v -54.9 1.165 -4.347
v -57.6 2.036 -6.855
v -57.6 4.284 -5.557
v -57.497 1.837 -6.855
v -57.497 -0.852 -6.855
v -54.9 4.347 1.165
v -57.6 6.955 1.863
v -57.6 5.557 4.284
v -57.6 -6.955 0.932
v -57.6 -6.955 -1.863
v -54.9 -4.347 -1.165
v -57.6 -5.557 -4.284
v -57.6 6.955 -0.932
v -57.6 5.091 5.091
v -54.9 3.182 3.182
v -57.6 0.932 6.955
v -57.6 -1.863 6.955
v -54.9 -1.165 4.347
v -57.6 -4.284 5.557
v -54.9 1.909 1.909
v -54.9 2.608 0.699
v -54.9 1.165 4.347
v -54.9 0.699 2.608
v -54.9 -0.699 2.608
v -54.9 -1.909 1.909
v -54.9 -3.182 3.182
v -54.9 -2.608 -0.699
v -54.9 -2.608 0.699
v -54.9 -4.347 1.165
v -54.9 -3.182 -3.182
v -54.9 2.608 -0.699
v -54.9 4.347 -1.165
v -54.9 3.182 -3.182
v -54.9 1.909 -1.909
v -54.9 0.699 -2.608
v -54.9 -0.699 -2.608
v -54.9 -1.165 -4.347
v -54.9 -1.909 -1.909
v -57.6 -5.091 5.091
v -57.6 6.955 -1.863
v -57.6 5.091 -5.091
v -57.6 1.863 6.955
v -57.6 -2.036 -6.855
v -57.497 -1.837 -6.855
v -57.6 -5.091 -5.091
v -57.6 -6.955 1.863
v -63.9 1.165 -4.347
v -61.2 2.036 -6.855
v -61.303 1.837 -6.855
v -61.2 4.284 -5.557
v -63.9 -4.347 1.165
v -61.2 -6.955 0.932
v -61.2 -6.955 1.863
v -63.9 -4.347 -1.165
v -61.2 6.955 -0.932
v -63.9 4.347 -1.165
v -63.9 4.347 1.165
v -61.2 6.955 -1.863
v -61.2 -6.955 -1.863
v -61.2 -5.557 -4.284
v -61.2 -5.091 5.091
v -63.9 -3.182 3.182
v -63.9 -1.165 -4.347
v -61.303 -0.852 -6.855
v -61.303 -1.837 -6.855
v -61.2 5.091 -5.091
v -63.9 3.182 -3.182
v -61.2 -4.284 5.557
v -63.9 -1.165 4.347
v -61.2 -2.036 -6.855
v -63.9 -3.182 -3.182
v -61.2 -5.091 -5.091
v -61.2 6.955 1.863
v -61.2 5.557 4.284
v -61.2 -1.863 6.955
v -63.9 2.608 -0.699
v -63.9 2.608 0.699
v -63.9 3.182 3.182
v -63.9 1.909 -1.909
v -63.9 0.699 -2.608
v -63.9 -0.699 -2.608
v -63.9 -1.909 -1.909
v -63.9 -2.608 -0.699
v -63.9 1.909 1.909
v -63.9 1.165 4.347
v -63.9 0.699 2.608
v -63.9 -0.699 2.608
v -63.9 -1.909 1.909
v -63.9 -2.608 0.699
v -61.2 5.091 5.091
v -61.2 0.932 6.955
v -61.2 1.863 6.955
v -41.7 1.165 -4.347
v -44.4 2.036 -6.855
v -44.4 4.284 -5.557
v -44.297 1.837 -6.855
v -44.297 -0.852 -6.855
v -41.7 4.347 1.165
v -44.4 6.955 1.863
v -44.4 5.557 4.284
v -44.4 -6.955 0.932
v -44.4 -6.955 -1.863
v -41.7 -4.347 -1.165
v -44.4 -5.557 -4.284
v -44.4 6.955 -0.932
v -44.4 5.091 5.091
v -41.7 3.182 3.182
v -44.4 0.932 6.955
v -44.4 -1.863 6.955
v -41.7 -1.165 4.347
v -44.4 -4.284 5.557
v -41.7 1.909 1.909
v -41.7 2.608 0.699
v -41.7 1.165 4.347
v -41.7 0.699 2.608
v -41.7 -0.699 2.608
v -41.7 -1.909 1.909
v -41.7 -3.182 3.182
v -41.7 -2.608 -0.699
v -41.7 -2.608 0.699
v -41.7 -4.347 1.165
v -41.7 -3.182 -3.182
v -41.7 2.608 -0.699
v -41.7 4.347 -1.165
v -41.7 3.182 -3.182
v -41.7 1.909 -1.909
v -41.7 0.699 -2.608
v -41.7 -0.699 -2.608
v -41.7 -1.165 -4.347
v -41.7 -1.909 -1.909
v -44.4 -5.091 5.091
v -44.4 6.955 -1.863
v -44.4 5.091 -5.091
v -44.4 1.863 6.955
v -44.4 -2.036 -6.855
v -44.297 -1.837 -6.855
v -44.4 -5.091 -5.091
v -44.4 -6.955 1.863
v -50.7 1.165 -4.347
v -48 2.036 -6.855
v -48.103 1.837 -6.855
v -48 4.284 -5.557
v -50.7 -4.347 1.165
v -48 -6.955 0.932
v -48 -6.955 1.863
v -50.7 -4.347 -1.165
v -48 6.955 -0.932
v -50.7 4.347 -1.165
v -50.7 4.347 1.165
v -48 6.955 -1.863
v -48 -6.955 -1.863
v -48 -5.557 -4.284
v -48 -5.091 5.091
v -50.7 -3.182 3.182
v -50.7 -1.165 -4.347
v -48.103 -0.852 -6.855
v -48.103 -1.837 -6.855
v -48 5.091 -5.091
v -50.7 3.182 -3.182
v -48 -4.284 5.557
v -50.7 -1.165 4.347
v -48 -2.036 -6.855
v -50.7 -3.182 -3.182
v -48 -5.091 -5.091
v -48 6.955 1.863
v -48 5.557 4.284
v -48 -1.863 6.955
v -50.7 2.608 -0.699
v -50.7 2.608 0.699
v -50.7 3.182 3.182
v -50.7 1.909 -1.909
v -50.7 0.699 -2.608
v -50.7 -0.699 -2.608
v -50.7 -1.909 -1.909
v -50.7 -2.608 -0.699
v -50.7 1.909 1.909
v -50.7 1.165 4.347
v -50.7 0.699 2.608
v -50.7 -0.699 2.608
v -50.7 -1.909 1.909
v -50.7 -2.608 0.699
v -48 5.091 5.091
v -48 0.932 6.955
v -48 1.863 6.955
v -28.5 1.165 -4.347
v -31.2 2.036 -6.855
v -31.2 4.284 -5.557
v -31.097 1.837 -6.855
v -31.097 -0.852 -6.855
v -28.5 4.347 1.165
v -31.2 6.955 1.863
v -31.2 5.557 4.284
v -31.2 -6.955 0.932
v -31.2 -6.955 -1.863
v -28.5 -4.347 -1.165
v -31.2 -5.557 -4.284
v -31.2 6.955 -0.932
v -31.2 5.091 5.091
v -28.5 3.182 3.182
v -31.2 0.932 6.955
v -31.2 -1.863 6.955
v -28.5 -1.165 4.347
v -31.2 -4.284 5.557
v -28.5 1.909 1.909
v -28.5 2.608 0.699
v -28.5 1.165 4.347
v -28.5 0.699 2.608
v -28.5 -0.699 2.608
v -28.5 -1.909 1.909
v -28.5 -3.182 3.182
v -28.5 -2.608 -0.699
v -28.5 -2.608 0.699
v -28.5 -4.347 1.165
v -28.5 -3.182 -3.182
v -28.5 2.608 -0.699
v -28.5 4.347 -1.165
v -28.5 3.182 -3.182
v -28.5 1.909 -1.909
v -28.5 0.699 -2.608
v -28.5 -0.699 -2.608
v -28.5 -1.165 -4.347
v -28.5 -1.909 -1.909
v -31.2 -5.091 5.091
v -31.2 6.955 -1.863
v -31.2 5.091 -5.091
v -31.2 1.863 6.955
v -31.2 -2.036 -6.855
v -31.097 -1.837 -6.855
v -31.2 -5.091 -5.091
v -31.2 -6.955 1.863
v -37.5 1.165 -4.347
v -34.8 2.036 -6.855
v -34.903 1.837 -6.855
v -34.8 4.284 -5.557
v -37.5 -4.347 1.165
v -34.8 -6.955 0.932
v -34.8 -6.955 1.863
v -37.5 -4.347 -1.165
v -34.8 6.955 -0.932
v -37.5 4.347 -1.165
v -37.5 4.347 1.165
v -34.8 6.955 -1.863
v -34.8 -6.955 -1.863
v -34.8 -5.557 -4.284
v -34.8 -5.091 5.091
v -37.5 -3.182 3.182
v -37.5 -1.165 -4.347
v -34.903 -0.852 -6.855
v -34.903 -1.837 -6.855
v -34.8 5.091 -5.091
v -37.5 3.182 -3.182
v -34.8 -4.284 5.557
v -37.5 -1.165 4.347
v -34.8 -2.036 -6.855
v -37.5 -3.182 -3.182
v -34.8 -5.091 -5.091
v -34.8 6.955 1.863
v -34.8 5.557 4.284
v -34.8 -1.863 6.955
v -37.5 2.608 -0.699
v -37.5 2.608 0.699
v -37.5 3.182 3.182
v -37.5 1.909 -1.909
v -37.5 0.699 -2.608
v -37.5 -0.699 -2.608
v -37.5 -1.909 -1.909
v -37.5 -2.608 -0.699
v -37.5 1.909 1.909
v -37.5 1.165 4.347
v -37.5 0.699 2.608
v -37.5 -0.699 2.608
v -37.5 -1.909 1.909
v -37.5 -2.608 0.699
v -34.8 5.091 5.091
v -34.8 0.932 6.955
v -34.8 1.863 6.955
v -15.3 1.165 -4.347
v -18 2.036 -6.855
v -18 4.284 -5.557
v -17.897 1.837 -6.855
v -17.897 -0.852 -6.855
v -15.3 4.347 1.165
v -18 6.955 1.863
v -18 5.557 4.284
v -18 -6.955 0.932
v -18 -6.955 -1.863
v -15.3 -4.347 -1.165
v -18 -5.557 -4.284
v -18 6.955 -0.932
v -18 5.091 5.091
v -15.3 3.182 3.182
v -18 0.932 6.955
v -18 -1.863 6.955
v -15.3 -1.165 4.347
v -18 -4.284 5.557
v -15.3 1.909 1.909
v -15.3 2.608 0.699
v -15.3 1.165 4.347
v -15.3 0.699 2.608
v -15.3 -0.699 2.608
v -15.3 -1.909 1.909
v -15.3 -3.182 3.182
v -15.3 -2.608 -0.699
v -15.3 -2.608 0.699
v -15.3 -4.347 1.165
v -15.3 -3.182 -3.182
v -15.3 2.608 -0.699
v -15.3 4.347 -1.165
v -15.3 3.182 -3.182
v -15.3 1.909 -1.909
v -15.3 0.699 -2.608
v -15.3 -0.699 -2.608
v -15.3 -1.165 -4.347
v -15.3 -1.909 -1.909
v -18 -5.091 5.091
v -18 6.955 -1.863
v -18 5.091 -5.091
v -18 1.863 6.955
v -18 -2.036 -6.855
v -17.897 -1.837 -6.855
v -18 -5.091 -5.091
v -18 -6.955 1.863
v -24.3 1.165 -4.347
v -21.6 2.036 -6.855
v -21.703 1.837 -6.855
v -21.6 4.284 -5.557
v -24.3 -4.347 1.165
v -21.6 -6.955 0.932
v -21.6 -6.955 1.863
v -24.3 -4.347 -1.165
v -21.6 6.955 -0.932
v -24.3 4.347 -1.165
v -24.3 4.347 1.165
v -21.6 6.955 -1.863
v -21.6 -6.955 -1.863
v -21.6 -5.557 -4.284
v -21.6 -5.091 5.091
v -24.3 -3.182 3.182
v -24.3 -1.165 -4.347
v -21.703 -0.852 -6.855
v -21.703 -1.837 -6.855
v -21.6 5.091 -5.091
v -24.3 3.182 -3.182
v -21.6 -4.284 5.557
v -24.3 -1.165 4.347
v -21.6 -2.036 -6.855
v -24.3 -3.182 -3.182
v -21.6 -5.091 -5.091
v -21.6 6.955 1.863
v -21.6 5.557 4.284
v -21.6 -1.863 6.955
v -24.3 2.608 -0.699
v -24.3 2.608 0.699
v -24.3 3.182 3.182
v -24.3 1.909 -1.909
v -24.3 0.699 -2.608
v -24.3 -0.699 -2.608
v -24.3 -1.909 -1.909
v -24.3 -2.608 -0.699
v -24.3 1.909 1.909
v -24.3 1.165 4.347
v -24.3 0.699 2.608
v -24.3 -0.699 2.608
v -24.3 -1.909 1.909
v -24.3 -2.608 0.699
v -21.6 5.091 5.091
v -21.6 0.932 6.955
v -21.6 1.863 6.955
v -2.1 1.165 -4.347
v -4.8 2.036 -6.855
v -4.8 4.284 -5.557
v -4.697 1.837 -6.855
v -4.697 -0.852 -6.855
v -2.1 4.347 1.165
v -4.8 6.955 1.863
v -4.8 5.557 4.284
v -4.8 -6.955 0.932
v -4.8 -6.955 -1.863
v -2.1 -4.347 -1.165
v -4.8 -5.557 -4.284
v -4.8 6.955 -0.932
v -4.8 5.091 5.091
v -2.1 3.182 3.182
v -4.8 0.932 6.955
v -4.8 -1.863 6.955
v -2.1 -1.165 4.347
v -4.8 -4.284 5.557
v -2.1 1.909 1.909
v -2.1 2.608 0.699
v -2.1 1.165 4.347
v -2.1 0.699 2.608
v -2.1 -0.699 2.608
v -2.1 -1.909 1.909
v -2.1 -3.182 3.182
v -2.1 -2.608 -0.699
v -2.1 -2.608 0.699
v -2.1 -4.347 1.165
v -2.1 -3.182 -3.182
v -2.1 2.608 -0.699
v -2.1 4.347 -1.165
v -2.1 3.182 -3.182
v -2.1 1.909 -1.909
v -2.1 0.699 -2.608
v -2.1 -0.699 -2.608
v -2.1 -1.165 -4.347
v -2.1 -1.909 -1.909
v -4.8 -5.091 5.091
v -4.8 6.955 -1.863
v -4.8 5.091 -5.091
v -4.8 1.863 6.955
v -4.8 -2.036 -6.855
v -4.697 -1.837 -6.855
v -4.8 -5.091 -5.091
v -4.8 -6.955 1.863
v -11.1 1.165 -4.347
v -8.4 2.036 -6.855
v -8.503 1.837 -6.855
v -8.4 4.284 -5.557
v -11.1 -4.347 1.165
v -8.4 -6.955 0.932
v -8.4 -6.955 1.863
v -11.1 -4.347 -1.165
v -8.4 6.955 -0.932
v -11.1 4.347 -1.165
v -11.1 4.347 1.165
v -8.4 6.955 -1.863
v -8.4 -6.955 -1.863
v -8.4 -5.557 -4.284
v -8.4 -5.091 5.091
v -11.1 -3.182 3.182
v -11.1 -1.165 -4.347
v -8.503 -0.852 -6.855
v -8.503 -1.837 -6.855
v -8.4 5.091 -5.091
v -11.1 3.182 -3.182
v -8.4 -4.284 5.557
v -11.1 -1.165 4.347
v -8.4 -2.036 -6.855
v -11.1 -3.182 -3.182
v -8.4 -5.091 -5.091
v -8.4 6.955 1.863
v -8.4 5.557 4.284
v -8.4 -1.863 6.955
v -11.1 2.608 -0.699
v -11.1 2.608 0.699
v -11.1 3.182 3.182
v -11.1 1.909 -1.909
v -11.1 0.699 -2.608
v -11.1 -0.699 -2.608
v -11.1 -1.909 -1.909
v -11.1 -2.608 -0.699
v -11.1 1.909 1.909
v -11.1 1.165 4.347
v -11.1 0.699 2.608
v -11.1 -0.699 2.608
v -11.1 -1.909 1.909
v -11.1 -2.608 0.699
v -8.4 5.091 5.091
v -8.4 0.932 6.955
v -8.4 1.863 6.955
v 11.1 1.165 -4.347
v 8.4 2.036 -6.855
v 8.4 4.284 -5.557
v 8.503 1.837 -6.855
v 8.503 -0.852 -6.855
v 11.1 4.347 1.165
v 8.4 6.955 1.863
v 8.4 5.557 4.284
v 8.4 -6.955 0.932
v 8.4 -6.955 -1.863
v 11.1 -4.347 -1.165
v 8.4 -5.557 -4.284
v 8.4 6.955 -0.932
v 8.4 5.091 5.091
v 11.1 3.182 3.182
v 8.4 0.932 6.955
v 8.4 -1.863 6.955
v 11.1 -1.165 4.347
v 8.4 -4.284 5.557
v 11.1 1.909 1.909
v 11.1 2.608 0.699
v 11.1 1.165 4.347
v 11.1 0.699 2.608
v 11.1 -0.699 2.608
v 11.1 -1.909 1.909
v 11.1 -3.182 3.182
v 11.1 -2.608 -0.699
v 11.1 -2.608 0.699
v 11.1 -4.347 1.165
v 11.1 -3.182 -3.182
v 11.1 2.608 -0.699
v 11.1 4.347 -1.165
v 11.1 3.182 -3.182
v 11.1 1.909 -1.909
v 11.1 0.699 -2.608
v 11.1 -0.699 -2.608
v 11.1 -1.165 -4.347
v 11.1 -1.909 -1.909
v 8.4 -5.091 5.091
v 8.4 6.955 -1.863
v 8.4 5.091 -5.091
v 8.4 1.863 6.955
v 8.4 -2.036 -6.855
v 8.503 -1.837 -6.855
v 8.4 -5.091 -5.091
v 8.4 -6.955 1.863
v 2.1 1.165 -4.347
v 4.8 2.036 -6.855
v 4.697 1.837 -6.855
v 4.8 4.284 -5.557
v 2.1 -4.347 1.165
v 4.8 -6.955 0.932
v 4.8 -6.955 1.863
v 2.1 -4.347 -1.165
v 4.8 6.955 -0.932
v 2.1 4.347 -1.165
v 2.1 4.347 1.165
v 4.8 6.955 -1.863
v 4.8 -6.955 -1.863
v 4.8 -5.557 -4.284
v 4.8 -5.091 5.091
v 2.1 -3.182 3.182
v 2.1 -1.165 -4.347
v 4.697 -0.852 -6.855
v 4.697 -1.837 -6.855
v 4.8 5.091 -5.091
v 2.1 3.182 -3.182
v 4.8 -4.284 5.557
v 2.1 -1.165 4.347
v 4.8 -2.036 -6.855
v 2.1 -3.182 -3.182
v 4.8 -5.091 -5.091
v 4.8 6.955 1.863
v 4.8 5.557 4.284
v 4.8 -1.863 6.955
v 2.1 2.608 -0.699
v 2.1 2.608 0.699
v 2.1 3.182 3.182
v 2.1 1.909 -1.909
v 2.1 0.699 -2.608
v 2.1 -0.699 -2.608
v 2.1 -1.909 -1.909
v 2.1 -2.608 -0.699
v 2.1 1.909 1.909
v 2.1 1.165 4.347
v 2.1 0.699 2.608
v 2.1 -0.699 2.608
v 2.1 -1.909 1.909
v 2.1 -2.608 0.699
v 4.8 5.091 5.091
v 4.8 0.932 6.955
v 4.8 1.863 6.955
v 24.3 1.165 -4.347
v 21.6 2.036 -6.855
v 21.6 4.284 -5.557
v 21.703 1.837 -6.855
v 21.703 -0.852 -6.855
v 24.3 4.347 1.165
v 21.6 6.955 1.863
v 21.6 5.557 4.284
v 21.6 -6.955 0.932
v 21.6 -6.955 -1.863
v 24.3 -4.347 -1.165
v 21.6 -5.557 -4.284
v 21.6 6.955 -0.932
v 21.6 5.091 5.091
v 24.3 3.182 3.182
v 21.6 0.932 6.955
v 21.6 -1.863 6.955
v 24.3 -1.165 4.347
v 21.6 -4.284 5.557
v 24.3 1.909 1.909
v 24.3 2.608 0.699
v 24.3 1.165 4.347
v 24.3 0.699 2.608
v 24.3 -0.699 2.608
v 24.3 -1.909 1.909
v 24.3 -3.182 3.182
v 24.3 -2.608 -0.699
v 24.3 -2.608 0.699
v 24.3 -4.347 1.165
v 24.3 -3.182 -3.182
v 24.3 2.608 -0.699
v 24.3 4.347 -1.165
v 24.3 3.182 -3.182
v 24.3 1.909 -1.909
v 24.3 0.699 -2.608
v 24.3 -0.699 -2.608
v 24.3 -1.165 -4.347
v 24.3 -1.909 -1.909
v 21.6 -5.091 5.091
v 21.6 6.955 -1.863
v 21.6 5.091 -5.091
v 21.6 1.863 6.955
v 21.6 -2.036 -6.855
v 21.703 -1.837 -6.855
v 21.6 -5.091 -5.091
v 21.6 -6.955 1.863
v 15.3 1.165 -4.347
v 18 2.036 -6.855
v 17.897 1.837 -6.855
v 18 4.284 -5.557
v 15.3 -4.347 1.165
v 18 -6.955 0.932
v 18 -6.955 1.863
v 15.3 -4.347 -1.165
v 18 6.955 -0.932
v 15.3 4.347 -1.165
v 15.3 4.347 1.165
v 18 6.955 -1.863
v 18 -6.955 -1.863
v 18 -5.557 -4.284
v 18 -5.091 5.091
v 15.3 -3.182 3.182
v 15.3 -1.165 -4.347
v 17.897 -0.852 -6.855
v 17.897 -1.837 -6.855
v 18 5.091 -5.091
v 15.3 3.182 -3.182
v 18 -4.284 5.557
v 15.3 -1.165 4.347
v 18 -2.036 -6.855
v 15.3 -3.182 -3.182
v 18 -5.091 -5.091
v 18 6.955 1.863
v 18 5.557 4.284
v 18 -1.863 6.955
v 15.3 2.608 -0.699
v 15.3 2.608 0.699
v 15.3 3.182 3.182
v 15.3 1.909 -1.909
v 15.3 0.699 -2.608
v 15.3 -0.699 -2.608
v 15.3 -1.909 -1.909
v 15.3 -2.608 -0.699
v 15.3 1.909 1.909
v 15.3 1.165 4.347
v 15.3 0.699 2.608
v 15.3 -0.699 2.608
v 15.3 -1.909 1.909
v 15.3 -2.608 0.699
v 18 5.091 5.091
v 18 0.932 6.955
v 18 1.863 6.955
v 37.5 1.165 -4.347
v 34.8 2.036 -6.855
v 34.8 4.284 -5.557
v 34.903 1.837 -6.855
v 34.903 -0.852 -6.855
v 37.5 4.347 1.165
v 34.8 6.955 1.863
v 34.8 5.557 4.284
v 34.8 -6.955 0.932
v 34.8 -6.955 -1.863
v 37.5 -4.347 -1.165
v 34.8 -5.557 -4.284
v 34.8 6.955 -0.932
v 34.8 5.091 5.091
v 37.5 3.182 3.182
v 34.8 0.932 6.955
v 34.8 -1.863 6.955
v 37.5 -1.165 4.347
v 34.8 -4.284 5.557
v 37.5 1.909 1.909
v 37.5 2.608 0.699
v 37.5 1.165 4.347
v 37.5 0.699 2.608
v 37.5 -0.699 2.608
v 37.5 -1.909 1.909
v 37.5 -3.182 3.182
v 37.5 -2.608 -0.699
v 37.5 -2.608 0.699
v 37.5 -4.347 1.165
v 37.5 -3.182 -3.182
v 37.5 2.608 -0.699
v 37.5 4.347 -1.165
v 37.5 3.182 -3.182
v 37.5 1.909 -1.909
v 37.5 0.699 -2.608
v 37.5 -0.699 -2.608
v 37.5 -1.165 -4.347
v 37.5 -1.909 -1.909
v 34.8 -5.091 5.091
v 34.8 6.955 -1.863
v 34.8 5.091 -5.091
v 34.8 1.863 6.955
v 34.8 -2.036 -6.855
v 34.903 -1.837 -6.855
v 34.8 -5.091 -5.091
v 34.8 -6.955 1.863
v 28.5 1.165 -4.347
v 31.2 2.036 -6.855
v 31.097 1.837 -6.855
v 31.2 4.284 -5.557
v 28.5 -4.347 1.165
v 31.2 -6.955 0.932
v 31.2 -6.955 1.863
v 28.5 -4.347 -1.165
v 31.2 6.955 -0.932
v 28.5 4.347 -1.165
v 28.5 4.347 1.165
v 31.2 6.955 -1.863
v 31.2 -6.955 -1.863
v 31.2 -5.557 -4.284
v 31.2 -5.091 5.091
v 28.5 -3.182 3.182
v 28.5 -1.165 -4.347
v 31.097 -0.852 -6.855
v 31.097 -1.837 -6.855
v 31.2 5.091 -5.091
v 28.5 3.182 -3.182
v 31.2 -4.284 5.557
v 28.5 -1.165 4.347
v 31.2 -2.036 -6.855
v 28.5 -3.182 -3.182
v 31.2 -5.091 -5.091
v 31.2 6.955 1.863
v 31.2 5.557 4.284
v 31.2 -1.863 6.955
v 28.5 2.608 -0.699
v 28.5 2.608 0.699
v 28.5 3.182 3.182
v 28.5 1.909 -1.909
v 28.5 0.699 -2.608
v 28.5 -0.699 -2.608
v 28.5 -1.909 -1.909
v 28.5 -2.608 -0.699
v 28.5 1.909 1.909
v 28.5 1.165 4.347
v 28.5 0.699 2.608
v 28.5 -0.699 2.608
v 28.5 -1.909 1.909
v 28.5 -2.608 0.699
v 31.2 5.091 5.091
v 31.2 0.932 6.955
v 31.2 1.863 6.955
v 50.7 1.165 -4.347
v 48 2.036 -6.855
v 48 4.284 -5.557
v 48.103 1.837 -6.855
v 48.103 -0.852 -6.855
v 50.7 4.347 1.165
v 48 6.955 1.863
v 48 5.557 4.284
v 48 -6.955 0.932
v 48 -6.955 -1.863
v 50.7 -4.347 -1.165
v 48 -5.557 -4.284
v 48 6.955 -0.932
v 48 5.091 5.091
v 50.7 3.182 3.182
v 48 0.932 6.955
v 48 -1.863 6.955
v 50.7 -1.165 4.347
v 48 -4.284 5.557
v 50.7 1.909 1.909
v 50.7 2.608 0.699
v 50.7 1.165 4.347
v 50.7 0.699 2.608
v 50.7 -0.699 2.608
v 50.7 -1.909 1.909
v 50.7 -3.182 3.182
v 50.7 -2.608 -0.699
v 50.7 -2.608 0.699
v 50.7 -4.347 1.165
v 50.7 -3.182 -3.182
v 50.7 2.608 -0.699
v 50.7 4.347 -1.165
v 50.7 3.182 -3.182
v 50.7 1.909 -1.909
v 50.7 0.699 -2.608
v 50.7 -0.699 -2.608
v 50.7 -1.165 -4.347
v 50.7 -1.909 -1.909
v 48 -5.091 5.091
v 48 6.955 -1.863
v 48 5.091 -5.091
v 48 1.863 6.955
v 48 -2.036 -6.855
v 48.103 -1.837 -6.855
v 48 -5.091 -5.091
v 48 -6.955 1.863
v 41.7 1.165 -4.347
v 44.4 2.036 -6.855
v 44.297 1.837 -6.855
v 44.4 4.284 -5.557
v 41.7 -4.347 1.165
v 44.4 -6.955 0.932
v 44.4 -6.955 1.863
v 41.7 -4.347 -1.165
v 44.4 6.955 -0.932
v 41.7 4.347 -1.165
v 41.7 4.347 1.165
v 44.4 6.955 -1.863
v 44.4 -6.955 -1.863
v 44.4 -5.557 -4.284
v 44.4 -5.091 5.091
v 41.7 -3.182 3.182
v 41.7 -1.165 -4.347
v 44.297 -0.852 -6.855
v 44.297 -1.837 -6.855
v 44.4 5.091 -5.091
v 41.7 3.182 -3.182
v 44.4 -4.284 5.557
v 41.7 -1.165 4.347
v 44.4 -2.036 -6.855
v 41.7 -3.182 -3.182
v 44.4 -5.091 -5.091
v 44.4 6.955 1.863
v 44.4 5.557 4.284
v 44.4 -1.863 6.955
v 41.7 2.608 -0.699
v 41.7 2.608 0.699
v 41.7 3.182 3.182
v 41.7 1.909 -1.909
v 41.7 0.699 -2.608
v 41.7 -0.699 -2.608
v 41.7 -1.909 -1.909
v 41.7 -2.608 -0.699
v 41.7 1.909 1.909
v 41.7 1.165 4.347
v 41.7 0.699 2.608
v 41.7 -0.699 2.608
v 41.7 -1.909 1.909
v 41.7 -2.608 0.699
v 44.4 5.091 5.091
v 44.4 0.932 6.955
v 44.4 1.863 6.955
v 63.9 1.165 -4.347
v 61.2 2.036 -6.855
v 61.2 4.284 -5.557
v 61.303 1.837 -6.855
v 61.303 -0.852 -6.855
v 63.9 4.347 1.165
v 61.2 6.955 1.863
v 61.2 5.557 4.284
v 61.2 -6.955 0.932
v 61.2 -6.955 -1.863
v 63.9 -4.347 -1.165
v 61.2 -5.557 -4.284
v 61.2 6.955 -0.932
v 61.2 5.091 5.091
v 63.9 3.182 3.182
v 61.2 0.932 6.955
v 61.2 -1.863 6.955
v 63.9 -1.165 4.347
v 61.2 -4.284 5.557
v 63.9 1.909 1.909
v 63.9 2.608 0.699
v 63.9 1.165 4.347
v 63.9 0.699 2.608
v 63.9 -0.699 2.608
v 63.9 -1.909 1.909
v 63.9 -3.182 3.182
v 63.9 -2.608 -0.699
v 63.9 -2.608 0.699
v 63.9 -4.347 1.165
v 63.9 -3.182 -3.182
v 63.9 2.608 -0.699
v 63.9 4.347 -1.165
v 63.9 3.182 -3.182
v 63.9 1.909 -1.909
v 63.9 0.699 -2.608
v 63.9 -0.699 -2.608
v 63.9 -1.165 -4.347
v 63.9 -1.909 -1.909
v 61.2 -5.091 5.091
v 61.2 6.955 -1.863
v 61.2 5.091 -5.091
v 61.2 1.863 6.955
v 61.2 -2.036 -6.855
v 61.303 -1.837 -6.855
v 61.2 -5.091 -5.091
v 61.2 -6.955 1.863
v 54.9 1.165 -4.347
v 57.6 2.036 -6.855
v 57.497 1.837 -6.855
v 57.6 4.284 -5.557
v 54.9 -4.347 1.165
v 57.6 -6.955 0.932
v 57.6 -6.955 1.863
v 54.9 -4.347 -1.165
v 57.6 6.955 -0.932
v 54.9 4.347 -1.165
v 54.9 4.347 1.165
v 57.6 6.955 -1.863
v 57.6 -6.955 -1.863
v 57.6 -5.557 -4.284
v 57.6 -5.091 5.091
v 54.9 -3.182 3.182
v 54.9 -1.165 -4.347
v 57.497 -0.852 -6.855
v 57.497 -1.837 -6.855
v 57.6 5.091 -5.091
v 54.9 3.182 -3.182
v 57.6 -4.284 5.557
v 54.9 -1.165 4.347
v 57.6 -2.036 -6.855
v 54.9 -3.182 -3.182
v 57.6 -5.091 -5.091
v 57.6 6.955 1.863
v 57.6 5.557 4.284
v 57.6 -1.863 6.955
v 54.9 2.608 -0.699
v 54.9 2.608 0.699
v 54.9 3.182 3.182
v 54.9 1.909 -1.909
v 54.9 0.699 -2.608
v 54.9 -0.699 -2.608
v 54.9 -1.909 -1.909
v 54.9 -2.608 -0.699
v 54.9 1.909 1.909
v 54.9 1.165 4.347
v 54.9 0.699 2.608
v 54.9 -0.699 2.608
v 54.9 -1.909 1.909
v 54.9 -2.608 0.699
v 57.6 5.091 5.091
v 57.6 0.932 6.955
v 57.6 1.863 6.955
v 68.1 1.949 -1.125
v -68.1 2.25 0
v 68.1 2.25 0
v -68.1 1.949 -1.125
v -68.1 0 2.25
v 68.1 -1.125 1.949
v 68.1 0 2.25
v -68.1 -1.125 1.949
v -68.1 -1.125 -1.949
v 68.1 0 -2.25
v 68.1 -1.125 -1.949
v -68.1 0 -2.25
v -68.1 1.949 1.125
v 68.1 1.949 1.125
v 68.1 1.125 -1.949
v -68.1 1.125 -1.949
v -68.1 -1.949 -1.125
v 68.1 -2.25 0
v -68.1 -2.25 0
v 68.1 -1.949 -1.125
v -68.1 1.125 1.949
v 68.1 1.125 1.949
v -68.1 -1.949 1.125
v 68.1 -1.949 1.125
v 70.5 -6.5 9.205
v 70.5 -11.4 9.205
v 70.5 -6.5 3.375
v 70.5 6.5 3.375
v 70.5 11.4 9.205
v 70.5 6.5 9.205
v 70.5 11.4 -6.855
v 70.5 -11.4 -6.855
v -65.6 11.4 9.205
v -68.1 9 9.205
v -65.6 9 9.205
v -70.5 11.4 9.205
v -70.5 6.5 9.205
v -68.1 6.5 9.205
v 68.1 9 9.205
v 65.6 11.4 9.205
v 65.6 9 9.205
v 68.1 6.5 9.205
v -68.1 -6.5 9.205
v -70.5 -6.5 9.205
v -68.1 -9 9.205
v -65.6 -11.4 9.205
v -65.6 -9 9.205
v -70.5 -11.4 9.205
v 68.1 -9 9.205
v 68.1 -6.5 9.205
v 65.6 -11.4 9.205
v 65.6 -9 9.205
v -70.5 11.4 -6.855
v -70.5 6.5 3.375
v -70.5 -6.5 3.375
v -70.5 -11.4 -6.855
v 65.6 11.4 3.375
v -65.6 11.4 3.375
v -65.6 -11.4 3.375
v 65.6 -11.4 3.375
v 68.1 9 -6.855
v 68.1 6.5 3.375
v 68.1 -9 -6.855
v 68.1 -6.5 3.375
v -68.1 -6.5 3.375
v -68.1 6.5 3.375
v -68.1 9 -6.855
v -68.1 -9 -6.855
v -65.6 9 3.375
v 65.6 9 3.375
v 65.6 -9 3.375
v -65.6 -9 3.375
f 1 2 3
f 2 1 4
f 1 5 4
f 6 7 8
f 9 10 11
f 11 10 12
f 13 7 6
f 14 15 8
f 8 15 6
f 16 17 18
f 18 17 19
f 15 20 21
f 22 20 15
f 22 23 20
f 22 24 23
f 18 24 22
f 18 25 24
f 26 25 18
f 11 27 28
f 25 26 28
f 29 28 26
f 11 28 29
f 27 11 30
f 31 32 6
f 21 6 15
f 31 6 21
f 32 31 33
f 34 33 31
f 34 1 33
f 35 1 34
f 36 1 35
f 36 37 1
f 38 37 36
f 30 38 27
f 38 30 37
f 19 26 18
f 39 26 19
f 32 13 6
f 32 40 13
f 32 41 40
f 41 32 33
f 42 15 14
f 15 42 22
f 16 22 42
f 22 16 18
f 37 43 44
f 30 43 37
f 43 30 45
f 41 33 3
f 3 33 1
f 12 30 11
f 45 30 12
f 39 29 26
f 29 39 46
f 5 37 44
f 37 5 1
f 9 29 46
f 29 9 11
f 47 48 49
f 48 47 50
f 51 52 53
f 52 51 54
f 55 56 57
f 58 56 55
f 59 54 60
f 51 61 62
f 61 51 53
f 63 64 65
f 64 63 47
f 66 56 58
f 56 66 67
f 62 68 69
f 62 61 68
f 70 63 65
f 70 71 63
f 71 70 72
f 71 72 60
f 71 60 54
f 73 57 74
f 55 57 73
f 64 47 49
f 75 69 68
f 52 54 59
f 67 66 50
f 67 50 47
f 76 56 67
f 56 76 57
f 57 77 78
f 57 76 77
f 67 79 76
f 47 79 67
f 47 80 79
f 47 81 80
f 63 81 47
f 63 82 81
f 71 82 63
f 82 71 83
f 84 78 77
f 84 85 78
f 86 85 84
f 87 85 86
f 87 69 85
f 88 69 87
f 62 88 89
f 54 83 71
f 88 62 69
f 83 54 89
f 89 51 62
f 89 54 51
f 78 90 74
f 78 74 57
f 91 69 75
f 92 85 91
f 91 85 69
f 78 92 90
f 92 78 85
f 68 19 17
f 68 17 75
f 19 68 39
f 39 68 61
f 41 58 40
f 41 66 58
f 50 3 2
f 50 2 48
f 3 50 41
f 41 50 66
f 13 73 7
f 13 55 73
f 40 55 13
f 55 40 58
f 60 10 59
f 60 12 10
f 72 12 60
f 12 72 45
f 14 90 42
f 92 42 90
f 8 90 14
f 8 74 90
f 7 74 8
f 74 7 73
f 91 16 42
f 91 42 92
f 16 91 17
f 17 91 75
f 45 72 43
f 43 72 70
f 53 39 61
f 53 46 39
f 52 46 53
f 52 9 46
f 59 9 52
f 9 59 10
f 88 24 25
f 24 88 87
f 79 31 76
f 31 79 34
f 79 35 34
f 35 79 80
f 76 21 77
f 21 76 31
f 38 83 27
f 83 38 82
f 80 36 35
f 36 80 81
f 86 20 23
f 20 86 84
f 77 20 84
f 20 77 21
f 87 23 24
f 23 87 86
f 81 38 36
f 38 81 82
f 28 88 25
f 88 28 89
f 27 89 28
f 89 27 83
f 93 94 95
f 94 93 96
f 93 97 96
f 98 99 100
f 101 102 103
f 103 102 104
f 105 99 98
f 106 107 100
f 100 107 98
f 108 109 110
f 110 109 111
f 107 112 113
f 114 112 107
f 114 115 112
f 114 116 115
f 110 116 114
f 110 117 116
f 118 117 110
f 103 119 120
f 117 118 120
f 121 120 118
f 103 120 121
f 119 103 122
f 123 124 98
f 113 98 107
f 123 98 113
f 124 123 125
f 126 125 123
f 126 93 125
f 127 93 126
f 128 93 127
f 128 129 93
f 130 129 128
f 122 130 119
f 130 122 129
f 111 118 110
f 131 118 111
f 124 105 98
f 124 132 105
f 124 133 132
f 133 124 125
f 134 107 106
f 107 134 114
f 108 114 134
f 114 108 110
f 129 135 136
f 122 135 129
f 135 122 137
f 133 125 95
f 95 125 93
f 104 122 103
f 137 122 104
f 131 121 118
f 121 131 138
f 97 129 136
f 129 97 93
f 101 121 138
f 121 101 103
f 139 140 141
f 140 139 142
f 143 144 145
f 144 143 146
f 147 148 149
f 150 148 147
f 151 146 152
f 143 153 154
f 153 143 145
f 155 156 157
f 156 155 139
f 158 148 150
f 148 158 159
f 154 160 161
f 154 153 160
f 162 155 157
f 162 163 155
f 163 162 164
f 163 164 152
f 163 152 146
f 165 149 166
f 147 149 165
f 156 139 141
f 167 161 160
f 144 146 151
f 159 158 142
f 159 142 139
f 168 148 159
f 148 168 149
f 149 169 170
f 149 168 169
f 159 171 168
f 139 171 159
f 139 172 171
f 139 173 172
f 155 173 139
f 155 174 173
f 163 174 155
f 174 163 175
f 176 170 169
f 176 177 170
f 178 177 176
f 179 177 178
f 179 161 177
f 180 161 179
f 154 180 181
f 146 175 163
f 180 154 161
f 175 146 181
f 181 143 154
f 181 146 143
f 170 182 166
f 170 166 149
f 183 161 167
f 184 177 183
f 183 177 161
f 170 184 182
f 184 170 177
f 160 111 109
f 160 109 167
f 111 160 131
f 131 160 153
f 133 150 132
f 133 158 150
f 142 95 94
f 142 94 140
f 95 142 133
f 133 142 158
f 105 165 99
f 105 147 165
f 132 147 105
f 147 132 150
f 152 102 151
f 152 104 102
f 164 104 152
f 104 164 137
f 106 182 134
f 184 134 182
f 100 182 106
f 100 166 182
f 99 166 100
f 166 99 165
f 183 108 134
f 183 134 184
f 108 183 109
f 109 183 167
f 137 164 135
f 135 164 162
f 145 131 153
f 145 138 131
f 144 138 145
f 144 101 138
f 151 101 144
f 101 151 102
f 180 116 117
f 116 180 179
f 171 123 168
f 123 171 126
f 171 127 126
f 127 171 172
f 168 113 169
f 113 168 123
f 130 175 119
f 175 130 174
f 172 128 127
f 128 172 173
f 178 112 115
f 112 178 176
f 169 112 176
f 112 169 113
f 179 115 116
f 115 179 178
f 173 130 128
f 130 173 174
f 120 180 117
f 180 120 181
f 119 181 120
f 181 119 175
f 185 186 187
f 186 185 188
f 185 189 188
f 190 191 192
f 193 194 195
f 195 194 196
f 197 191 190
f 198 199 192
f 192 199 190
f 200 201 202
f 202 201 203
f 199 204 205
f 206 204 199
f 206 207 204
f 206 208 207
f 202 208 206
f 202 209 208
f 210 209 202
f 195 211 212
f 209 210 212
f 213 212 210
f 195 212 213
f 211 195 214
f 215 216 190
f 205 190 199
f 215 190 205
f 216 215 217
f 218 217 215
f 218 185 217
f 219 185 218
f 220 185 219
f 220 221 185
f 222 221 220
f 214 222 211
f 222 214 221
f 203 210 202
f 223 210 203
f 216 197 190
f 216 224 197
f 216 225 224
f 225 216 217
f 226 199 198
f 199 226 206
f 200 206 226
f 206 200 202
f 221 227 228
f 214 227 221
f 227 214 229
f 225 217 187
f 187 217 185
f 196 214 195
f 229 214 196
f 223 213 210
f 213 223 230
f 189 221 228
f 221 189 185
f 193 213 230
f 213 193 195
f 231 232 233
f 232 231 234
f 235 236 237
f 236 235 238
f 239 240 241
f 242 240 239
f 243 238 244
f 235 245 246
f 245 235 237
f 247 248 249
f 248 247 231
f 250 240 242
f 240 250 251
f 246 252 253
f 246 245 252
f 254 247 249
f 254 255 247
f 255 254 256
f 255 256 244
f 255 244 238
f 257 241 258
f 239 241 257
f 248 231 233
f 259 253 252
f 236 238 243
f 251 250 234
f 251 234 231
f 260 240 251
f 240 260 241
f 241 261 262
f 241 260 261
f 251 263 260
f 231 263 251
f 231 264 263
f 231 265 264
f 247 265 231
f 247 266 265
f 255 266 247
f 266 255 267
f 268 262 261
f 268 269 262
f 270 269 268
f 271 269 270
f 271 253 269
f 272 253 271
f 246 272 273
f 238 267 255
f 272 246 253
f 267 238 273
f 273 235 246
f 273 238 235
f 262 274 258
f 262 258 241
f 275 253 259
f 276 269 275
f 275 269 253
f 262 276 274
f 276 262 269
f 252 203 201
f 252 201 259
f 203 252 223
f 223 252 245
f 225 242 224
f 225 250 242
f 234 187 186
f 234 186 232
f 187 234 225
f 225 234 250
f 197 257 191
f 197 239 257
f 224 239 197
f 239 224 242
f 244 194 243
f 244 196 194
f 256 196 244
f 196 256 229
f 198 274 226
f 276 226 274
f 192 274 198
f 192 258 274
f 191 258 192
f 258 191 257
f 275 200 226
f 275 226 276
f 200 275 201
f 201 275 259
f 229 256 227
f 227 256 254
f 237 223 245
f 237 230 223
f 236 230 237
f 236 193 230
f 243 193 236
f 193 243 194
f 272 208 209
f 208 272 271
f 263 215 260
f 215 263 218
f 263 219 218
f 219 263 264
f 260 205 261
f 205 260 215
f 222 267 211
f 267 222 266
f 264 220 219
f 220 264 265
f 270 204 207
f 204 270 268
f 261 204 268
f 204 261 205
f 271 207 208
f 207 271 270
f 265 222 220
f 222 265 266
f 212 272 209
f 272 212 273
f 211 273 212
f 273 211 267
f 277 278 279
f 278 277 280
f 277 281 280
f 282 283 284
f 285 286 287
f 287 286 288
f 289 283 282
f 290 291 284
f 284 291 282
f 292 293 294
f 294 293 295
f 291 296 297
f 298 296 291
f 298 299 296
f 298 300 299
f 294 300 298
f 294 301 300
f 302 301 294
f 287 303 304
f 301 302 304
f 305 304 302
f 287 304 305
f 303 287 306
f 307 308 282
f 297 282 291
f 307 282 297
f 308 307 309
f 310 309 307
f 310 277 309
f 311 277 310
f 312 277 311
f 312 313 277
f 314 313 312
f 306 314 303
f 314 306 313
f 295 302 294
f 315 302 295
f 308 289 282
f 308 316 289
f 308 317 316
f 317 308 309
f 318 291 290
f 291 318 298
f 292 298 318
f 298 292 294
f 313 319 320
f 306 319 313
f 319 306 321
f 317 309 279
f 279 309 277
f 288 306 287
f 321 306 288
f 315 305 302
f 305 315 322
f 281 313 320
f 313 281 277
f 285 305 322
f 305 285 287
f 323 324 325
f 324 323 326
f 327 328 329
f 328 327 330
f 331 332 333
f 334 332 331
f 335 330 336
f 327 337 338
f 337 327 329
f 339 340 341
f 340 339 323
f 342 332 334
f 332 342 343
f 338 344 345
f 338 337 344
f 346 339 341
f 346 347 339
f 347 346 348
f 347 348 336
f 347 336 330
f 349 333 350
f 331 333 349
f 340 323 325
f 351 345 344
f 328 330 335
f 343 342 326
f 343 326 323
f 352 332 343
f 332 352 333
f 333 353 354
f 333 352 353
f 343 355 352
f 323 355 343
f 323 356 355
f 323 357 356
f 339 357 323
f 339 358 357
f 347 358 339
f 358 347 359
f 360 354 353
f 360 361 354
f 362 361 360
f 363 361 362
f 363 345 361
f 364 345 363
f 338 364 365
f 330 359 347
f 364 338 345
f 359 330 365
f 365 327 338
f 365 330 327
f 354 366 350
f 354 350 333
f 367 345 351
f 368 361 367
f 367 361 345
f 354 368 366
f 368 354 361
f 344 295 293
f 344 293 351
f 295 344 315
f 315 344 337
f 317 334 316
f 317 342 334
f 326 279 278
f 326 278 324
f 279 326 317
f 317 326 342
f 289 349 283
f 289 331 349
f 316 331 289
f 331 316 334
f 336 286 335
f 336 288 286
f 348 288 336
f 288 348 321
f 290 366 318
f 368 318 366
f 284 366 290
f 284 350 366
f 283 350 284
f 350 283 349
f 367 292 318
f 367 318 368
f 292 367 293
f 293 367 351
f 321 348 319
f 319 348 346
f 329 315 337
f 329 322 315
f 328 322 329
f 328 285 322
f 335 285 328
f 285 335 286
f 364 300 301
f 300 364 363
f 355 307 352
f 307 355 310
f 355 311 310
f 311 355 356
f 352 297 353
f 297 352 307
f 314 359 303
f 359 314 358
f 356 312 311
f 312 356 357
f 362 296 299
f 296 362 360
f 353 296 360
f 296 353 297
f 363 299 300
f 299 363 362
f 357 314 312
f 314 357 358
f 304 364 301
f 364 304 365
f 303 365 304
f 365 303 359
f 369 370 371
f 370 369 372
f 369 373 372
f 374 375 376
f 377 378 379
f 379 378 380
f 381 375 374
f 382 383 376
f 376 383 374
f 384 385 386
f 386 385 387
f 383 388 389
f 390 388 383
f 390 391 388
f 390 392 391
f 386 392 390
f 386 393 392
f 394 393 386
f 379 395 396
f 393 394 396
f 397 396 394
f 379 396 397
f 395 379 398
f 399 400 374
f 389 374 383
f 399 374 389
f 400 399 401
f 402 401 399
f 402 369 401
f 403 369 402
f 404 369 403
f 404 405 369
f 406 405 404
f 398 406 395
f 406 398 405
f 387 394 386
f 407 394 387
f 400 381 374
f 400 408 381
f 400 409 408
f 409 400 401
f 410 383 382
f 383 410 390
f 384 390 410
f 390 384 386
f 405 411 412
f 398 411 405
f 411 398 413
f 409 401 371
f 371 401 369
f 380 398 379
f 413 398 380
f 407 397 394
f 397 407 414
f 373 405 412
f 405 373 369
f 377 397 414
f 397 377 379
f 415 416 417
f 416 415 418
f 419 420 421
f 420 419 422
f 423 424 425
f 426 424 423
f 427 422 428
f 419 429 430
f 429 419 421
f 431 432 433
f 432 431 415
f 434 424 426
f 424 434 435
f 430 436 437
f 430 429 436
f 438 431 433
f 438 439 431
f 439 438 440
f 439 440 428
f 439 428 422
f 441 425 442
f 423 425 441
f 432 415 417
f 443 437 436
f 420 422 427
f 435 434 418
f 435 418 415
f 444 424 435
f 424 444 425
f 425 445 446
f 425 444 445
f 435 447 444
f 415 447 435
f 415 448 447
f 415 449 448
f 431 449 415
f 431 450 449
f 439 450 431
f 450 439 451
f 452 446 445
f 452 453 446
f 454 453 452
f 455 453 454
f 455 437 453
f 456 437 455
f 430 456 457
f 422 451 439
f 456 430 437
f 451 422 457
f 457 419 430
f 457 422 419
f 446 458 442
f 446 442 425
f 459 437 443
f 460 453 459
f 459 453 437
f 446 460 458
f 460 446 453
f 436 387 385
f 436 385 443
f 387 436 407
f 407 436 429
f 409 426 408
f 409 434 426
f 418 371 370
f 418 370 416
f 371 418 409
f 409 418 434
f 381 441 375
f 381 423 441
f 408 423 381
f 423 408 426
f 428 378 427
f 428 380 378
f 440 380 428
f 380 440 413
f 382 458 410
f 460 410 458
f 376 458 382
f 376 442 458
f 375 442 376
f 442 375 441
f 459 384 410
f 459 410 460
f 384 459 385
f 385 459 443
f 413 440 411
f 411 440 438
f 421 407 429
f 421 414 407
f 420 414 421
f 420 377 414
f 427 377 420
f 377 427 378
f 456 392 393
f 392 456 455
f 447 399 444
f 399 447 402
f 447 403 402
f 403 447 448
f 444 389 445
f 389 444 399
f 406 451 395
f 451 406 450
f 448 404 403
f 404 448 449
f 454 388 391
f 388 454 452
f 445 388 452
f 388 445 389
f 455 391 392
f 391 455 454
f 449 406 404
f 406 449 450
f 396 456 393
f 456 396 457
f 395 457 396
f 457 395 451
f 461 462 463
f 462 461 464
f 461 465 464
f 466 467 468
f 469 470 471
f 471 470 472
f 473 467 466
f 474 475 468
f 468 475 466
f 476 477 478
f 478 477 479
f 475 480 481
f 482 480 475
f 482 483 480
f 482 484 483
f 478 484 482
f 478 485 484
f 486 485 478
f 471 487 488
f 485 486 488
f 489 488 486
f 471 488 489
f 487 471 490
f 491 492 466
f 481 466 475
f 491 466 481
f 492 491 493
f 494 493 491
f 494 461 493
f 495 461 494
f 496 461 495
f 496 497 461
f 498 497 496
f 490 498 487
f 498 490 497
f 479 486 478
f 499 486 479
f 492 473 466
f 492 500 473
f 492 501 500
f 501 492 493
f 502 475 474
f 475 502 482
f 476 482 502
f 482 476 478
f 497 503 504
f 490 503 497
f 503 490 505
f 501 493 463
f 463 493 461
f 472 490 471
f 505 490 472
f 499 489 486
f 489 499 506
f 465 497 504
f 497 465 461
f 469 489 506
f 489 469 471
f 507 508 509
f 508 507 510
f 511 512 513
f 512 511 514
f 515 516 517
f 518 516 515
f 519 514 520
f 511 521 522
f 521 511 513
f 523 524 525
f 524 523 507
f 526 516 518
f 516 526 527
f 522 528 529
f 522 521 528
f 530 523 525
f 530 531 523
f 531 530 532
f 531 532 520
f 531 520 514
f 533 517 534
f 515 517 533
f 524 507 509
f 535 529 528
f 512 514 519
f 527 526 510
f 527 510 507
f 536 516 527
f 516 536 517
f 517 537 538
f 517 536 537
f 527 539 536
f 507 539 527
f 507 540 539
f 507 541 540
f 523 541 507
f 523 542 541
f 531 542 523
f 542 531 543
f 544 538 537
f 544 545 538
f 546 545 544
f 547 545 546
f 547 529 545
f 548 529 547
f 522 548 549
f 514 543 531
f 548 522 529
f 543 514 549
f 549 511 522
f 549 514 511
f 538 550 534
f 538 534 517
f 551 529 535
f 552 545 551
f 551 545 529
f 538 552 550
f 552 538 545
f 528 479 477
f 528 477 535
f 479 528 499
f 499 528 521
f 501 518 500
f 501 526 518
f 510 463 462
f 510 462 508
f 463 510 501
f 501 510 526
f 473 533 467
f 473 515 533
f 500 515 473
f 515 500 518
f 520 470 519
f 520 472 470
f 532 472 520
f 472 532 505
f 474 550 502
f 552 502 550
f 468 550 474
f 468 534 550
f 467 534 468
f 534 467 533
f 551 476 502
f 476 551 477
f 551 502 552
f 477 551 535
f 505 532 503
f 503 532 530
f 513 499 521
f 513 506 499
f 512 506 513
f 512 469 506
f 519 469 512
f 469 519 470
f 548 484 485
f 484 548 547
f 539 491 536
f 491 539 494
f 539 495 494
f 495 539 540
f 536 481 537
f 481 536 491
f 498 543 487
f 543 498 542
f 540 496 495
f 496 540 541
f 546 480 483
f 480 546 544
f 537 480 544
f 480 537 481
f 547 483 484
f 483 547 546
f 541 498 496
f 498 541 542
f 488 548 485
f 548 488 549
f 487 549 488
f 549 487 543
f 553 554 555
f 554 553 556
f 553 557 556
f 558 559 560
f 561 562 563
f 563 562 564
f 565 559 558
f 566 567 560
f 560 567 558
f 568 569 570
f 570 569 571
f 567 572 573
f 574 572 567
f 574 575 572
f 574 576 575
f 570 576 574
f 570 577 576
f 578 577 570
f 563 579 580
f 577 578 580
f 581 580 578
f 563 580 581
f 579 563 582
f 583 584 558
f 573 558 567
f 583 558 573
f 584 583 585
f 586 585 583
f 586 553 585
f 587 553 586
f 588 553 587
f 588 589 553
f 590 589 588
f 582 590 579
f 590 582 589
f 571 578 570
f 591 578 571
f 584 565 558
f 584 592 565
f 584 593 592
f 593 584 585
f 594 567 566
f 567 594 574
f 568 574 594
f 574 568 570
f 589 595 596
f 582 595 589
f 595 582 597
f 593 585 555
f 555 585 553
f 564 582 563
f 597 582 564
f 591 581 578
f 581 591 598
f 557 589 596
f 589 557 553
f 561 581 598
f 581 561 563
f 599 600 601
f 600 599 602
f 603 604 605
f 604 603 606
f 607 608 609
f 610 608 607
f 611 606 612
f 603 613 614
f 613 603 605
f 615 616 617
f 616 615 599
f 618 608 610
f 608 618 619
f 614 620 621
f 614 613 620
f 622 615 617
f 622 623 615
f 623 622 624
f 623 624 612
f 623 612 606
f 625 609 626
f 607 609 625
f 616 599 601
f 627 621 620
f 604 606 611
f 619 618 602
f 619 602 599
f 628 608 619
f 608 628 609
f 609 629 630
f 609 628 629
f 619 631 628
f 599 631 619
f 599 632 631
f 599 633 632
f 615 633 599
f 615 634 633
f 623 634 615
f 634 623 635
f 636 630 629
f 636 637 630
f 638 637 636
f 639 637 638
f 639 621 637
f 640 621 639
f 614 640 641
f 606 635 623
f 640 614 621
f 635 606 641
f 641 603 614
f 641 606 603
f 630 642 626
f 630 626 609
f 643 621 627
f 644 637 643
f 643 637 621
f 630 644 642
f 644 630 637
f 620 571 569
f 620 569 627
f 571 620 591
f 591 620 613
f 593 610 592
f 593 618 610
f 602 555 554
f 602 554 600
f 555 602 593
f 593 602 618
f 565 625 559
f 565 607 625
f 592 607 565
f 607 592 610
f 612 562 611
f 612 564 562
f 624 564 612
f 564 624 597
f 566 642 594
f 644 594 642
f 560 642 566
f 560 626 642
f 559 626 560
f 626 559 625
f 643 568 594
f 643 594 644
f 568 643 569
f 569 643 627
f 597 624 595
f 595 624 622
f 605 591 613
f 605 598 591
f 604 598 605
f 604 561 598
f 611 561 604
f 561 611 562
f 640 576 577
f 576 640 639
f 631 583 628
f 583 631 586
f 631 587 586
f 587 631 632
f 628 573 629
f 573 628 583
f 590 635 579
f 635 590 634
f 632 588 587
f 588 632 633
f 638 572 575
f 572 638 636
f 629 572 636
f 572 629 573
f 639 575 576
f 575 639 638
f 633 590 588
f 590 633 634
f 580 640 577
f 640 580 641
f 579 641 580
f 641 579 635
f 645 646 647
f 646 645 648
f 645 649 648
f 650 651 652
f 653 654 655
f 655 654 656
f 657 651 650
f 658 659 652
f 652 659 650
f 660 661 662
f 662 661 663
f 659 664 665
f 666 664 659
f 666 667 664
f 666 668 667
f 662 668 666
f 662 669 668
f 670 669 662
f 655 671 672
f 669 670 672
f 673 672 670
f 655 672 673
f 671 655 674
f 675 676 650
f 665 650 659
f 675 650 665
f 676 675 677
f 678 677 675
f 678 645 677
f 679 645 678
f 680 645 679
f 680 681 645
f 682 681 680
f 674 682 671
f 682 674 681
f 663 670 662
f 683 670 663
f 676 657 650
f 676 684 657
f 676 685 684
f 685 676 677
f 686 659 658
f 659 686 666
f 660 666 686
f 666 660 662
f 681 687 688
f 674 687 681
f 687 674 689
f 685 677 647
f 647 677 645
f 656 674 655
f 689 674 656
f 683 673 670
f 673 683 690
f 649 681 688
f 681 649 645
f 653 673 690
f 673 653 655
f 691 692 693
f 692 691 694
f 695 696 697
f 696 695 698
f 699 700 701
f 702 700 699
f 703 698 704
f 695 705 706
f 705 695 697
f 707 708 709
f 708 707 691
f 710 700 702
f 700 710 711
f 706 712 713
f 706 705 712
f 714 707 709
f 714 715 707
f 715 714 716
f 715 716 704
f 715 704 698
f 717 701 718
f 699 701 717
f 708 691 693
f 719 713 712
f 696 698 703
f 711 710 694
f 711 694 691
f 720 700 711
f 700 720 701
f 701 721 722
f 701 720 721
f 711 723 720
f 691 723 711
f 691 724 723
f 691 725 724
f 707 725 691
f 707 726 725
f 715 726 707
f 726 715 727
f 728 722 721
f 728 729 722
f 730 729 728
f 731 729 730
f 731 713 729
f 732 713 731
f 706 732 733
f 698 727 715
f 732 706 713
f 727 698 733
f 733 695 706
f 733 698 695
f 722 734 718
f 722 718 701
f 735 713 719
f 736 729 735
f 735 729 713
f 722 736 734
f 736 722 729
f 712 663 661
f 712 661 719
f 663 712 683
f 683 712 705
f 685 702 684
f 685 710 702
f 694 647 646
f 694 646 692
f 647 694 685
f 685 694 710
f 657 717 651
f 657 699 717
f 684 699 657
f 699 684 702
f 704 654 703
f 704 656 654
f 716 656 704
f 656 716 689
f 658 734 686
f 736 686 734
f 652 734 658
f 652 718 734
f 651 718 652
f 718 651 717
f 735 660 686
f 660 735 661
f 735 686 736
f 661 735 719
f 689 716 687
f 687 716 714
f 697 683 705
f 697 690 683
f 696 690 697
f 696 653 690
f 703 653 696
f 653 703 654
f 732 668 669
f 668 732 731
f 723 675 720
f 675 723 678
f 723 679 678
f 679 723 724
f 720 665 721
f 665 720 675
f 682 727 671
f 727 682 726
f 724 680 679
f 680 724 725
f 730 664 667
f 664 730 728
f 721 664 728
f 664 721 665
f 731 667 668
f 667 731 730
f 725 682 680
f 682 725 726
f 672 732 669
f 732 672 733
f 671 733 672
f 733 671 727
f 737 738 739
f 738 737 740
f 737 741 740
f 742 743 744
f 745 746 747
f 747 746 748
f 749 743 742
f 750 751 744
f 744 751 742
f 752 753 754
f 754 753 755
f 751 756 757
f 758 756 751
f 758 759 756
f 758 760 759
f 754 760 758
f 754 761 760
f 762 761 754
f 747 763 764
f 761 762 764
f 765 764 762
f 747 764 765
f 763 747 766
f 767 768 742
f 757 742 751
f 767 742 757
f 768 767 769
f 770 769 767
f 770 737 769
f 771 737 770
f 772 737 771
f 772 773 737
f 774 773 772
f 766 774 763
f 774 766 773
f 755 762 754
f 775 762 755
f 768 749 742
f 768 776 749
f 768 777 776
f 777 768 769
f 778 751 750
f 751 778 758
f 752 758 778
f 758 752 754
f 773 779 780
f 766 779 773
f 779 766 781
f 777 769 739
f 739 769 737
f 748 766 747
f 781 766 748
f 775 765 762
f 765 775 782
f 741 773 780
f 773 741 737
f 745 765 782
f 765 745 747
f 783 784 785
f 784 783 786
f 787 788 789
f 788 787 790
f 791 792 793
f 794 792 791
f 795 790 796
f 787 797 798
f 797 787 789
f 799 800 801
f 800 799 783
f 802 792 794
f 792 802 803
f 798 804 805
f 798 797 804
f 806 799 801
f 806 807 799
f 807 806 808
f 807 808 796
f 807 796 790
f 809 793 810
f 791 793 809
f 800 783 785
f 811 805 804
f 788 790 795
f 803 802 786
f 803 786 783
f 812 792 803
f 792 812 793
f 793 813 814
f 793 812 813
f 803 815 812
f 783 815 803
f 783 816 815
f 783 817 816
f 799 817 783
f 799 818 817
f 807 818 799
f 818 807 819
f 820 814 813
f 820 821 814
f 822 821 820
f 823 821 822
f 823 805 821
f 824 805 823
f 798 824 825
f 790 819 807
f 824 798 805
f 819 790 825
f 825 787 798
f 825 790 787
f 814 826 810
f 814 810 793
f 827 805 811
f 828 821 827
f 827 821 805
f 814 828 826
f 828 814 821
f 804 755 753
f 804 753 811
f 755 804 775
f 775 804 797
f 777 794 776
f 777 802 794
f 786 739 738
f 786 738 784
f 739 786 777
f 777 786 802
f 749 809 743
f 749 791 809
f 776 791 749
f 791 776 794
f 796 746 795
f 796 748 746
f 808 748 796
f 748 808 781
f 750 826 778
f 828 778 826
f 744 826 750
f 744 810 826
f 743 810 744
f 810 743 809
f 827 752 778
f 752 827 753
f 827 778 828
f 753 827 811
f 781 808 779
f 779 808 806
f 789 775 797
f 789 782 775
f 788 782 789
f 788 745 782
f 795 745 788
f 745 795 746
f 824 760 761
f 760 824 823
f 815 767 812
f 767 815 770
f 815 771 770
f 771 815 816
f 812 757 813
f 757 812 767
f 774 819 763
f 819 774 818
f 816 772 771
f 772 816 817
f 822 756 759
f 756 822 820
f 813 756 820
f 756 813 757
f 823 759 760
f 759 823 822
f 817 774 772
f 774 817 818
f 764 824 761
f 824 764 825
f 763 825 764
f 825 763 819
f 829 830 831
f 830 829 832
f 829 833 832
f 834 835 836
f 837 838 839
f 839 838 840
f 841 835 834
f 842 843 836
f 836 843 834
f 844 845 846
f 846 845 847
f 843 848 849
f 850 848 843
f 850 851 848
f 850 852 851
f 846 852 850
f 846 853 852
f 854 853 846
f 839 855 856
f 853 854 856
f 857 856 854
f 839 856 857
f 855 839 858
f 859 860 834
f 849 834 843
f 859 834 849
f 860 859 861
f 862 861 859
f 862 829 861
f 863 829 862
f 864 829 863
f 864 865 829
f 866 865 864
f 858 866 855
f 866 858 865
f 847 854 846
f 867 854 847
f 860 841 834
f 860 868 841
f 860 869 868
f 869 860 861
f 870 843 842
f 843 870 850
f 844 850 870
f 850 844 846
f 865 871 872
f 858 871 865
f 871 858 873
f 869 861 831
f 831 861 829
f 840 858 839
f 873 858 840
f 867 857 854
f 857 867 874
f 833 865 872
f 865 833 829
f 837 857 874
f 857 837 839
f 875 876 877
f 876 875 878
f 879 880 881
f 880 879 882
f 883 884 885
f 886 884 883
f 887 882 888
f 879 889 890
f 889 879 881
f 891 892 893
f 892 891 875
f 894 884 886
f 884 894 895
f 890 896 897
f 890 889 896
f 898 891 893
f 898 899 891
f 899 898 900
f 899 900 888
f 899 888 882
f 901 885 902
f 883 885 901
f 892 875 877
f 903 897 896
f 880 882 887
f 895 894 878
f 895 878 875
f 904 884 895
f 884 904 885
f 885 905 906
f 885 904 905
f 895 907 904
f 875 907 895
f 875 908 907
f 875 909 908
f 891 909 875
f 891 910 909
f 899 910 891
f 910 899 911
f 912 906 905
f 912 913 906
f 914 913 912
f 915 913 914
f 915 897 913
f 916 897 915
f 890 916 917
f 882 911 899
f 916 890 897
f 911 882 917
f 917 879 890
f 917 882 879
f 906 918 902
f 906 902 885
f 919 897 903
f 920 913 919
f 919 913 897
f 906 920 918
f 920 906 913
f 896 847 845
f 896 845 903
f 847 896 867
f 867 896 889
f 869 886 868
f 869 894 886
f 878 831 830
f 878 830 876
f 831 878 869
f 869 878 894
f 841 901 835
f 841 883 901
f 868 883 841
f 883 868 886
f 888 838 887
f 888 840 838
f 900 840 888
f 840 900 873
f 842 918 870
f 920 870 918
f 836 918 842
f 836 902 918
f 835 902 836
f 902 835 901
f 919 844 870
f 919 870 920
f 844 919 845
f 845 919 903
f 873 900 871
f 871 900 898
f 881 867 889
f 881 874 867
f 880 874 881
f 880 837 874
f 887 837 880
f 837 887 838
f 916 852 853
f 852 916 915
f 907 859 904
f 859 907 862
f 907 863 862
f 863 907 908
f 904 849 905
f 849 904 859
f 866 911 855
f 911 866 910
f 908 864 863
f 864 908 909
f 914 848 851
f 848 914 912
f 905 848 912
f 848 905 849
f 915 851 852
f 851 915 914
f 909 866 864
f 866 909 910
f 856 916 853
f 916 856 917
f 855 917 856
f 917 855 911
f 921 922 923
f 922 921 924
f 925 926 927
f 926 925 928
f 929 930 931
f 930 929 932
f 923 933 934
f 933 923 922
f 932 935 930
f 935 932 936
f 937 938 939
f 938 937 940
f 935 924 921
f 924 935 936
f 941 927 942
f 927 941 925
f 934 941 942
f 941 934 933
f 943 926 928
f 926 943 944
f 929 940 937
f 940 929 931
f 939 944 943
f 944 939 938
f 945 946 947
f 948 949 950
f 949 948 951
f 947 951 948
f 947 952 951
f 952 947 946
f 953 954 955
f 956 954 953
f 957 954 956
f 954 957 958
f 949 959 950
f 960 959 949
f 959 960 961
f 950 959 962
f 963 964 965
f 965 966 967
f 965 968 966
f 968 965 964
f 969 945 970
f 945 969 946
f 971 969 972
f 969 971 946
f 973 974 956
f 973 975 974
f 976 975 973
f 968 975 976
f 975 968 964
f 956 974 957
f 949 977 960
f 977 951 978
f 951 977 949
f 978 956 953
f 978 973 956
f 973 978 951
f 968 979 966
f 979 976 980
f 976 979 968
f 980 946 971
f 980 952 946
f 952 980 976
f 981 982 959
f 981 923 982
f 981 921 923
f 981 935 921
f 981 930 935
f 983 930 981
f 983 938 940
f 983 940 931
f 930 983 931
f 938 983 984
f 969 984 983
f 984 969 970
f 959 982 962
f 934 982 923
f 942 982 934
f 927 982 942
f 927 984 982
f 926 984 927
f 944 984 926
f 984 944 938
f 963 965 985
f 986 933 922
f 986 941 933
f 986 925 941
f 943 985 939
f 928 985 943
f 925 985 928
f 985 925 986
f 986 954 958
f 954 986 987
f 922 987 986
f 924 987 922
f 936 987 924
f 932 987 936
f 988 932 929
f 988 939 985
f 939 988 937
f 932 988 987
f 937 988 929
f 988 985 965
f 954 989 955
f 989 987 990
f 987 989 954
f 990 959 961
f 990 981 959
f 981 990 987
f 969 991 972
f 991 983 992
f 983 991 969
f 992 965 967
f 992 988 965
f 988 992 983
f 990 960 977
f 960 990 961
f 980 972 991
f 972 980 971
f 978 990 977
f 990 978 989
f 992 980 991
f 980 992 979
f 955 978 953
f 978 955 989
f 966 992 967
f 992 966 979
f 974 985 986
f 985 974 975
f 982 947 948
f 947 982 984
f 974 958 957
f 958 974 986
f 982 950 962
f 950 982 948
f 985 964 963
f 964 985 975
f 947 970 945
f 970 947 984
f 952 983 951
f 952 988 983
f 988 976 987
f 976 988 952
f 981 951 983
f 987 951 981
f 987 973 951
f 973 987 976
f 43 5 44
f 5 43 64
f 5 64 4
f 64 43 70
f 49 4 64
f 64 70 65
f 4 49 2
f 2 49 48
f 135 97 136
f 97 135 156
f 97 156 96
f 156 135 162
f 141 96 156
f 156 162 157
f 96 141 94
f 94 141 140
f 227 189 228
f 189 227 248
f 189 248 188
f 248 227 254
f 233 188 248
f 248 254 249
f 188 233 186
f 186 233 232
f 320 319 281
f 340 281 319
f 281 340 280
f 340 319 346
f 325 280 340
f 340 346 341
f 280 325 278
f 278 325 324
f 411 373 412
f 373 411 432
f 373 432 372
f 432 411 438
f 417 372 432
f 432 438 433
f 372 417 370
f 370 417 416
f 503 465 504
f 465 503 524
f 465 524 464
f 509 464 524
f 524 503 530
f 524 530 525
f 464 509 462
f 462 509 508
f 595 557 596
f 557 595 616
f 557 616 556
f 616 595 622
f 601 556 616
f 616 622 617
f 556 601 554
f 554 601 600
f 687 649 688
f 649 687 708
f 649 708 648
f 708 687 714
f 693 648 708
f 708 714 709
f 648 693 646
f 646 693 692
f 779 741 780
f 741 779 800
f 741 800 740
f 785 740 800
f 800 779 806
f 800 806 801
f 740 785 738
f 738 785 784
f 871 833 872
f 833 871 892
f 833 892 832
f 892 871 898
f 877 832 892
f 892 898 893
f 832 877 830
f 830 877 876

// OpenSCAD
number_of_balls=10; 

//Thickness in mm, scaled by 0.6
Thickness_of_box=4;

//Distance between two balls in mm, scaled by 0.6
distance_between_balls=7;



// Configurable Abacus
// Version 3, March 2014

// By default, its a 10-ball version is for the board game Tikal to count the action points remaining
// Print it "upside down" with the feet up. It prints in one go.
// After printing, move the balls a bit and pull out the plastic fibers which are loose.

// Written by MC Geisler (m c genki at gmail dot com)

// This program is free software; you can redistribute it and/or modify
// it under the terms of the GNU General Public License as published by
// the Free Software Foundation; either version 2 of the License, or
// (at your option) any later version.
// See the GNU General Public License for more details.


//Scaling the Abacus
scale=0.6; 

ball_width_radius=15*scale; //if it would be pointy in the middle
ballabstand=distance_between_balls*scale; 
ball_height_radius=ball_width_radius*.8;//the radius of the flattening cylinder in the middle
ball_min_height_radius=ball_height_radius*.966;

stangenradius=ball_width_radius/4;
stangenluft=.75*scale; //bei 1mm*scale wackelts noch, entspricht 0.52356 -> 0,3
echo ("Distance rod to ball: ",stangenluft); 

//make the balls with 12 faces
$fn=12;


stangenlaenge=(ball_width_radius+ballabstand)*number_of_balls+ballabstand;

kistendicke=Thickness_of_box*scale;
kistenhoehe=ball_min_height_radius*2+stangenradius;
kisteninnenbreite=ball_height_radius*2.5;
kisteninnenlaenge=stangenlaenge;

kistenlaenge=kisteninnenlaenge+2*kistendicke;
kistenbreite=kisteninnenbreite+2*kistendicke;

echo ("Length of Abacus: ",kistenlaenge); 

module halberball()
{
	cylinder(h = ball_width_radius/2, r1 = ball_width_radius, r2 = ball_width_radius/2, center = false);
}

module ball()
{
	rotate([360/$fn/2,0,0])
	rotate([0,90,0])
	difference()
	{
		union()
		{
			halberball();
			mirror([0,0,1]) halberball();
		}
			cylinder(h = ball_width_radius*3, r = stangenradius+stangenluft,center=true);
			difference()
			{
				cylinder(h = ball_width_radius*3, r = ball_width_radius*2,center=true);
				cylinder(h = ball_width_radius*3, r = ball_height_radius,center=true);
			}
	}
}

//----------------------------------

difference()
{
	union()
	{
		//kugeln
		translate([-stangenlaenge/2,0,0])
		{
			for (i = [0:number_of_balls-1]) 
			{
					translate([ball_width_radius/2+ballabstand+i*(ball_width_radius+ballabstand),0,0])
						ball(i);
			}
			
			//stange
			rotate([0,90,0])
				translate([0,0,-kistendicke/2])
					cylinder(h=stangenlaenge+kistendicke, r=stangenradius);
		}

		//kiste
		translate([0,0,(kistenhoehe-ball_min_height_radius*2)/2])
		{
			difference()
			{
				cube([kistenlaenge,kistenbreite,kistenhoehe],center=true);
				cube([kisteninnenlaenge,kisteninnenbreite,kistenhoehe*2],center=true);

				translate([0,0,kistenhoehe/2+stangenradius])
					cube([kisteninnenlaenge-5,kisteninnenbreite*2,kistenhoehe],center=true);
				translate([0,0,kistenhoehe/2+stangenradius])
					cube([kisteninnenlaenge*2,kisteninnenbreite-5,kistenhoehe],center=true);
				
			}
		}
	}
	
	translate([0,0,-30/2-ball_min_height_radius+.1])
		cube([kisteninnenlaenge+2*kistendicke*2,kisteninnenbreite+2*kistendicke*2,30],center=true);
}
